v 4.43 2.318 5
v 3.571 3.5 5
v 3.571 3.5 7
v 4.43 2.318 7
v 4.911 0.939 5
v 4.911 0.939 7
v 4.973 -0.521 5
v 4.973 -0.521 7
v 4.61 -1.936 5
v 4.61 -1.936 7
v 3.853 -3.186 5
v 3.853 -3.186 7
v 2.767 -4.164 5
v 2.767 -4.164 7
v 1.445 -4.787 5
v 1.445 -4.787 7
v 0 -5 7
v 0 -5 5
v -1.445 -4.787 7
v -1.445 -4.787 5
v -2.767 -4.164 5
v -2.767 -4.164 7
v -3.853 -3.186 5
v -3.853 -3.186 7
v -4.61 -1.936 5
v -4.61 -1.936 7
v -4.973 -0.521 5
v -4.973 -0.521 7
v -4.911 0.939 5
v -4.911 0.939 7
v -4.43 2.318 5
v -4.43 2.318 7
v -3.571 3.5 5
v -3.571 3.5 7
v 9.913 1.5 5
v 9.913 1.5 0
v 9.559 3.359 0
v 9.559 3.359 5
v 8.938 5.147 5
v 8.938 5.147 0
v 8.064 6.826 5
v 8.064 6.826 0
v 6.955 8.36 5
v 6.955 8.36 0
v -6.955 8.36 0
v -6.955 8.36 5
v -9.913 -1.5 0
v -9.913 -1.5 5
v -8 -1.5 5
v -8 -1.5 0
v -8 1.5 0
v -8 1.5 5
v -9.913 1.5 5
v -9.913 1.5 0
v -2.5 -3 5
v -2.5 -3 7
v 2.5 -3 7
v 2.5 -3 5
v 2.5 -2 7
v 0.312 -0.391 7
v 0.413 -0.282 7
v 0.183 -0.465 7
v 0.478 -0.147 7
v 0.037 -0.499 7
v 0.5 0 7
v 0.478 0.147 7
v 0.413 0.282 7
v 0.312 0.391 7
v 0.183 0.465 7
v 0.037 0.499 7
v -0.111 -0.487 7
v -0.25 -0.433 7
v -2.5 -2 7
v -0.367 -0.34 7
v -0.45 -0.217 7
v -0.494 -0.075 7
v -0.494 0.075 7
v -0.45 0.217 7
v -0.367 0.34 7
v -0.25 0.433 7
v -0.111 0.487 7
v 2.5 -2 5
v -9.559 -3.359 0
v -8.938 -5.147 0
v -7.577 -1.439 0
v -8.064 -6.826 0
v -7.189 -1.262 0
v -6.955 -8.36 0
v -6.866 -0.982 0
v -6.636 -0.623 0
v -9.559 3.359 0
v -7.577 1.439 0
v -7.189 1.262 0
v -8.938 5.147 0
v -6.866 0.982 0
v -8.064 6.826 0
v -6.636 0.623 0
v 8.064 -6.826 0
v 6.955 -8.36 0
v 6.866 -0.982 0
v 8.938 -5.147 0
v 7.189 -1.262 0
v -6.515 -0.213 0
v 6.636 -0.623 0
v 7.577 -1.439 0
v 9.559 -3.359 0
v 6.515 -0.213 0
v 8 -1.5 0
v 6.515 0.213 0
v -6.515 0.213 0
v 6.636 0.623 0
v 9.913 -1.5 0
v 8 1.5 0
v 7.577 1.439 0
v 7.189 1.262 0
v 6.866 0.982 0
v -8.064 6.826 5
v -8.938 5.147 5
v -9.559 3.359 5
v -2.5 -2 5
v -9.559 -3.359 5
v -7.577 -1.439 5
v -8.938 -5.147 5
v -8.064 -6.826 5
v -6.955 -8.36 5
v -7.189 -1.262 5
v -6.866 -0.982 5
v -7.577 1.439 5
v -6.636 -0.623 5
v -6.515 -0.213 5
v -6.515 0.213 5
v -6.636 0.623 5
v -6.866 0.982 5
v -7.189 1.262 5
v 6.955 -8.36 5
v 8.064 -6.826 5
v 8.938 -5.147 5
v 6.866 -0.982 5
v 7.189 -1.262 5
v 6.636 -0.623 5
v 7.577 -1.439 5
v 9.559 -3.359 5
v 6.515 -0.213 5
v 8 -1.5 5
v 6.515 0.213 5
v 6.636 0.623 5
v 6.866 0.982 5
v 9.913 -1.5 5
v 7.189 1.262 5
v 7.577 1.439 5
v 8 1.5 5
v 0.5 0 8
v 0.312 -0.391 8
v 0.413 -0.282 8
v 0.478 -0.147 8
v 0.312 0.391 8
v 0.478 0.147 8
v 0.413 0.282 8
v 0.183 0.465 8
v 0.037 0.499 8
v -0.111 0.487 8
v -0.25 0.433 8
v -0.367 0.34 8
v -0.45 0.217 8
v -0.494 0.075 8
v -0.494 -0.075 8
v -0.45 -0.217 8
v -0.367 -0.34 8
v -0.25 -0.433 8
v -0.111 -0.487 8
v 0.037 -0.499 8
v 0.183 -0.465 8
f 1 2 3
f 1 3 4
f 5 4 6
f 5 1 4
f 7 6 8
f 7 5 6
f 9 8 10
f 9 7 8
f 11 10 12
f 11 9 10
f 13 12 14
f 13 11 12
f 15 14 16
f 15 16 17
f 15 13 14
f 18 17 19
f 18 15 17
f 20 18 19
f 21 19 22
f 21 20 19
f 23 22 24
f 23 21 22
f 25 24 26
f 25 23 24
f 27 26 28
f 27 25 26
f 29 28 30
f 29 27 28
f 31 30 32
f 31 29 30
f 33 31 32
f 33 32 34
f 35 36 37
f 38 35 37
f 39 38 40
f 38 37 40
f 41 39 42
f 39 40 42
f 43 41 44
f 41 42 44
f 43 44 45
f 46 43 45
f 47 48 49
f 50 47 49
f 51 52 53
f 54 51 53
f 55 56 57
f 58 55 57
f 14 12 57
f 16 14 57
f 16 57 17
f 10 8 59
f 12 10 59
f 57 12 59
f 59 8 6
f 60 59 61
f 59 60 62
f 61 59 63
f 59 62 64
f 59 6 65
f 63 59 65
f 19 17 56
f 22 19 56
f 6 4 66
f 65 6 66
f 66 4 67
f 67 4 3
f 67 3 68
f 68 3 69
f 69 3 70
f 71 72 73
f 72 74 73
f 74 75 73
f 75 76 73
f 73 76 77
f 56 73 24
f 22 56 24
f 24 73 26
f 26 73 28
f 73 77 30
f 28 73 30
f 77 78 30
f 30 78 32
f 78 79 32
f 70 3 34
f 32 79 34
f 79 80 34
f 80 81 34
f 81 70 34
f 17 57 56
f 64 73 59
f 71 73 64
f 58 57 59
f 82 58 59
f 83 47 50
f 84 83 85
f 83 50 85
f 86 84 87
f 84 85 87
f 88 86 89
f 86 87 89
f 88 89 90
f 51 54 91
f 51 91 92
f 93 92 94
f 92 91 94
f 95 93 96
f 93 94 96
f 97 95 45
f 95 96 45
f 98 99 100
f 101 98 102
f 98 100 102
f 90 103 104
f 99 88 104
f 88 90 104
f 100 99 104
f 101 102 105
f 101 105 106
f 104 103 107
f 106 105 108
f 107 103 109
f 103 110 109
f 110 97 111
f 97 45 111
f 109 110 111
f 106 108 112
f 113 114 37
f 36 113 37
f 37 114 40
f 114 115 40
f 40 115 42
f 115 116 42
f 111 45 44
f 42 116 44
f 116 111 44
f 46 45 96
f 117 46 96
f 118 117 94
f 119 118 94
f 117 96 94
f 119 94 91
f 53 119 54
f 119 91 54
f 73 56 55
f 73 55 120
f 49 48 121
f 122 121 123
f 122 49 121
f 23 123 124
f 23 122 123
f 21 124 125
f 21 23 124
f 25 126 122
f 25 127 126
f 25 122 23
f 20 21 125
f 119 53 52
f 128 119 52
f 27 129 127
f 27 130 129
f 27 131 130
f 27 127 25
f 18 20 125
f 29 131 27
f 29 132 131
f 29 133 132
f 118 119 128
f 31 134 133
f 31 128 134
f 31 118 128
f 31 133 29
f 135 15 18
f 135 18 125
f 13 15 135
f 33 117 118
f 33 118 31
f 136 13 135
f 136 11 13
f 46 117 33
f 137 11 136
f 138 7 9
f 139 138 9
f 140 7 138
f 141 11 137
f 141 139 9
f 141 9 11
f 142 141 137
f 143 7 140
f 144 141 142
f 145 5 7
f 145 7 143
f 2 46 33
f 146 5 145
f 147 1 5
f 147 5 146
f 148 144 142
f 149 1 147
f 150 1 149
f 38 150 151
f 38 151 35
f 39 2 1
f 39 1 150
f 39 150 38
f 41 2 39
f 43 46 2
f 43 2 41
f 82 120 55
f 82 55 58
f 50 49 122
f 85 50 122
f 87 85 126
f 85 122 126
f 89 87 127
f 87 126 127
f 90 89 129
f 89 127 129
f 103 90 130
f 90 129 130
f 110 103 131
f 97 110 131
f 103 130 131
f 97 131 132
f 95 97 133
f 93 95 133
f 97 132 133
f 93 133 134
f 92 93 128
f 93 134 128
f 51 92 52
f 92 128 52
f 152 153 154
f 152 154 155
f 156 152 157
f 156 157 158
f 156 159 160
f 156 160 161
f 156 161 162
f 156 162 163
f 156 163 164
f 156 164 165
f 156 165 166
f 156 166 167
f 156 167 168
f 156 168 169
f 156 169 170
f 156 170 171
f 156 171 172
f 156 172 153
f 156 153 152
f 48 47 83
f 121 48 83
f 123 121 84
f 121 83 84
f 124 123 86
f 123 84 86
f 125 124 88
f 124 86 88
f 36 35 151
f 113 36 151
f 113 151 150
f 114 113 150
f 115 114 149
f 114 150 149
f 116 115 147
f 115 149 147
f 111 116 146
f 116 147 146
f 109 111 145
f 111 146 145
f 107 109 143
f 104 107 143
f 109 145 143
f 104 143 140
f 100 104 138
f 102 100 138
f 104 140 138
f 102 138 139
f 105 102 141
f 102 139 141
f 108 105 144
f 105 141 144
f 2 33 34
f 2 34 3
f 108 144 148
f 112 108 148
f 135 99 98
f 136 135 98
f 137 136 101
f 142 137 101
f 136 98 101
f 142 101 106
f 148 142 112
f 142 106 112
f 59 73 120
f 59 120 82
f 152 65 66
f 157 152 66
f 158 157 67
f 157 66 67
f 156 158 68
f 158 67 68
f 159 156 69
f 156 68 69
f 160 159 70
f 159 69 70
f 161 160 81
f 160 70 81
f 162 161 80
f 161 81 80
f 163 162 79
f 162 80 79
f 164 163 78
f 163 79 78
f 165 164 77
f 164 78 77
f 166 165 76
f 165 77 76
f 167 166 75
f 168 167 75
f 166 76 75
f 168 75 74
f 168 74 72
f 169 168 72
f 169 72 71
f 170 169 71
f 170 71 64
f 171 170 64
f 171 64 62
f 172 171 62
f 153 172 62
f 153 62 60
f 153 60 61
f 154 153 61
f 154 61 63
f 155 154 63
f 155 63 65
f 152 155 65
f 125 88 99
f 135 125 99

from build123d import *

# Parameters (mm, degrees)
BOSS_EXTRUDE2_DEPTH = 5
CUT_EXTRUDE1_DEPTH  = 5
SKETCH3_R           = 0.5
BOSS_EXTRUDE3_DEPTH = 3
BOSS_EXTRUDE4_DEPTH = 2
SKETCH5_W           = 5
SKETCH5_H           = 1
CUT_EXTRUDE2_DEPTH  = 2


with BuildPart() as part:
    # Sketch1 → Boss-Extrude2 (new body)
    with BuildSketch(Plane.XY):
        with BuildLine():
            ThreePointArc((-6.955420634, 8.36), (-9.215164105, 4.44856897), (-10, 0))
            Line((-10, 0), (10, 0))
            ThreePointArc((10, 0), (9.215164105, 4.44856897), (6.955420634, 8.36))
            Line((6.955420634, 8.36), (-6.955420634, 8.36))
        make_face()
        with BuildLine():
            Line((10, 0), (-10, 0))
            ThreePointArc((-10, 0), (-9.215164105, -4.44856897), (-6.955420634, -8.36))
            Line((-6.955420634, -8.36), (6.955420634, -8.36))
            ThreePointArc((6.955420634, -8.36), (9.215164105, -4.44856897), (10, 0))
        make_face()
    extrude(amount=BOSS_EXTRUDE2_DEPTH)

    # Sketch2 → Cut-Extrude1 (cut)
    with BuildSketch(Plane.XY.offset(5)):
        with BuildLine():
            Line((-8, 1.5), (-9.91317157, 1.5))
            Line((-9.91317157, 1.5), (-10.317130361, 1.5))
            ThreePointArc((-10.317130361, 1.5), (-10.425602087, 0), (-10.317130361, -1.5))
            Line((-10.317130361, -1.5), (-9.91317157, -1.5))
            Line((-9.91317157, -1.5), (-8, -1.5))
            ThreePointArc((-8, -1.5), (-6.5, 0), (-8, 1.5))
        make_face()
        with BuildLine():
            Line((8, -1.5), (9.91317157, -1.5))
            Line((9.91317157, -1.5), (10.317130361, -1.5))
            ThreePointArc((10.317130361, -1.5), (10.425602087, 0), (10.317130361, 1.5))
            Line((10.317130361, 1.5), (9.91317157, 1.5))
            Line((9.91317157, 1.5), (8, 1.5))
            ThreePointArc((8, 1.5), (6.5, 0), (8, -1.5))
        make_face()
    extrude(amount=-CUT_EXTRUDE1_DEPTH, mode=Mode.SUBTRACT)

    # Sketch3 → Boss-Extrude3 (add)
    with BuildSketch(Plane.XY.offset(5)):
        Circle(SKETCH3_R)
    extrude(amount=BOSS_EXTRUDE3_DEPTH)

    # Sketch4 → Boss-Extrude4 (add)
    with BuildSketch(Plane.XY.offset(5)):
        with BuildLine():
            Line((-3.570714214, 3.5), (3.570714214, 3.5))
            ThreePointArc((3.570714214, 3.5), (0, -5), (-3.570714214, 3.5))
        make_face()
    extrude(amount=BOSS_EXTRUDE4_DEPTH)

    # Sketch5 → Cut-Extrude2 (cut)
    with BuildSketch(Plane.XY.offset(7)):
        with Locations((0, -2.5)):
            Rectangle(SKETCH5_W, SKETCH5_H)
    extrude(amount=-CUT_EXTRUDE2_DEPTH, mode=Mode.SUBTRACT)


solid = part.part
